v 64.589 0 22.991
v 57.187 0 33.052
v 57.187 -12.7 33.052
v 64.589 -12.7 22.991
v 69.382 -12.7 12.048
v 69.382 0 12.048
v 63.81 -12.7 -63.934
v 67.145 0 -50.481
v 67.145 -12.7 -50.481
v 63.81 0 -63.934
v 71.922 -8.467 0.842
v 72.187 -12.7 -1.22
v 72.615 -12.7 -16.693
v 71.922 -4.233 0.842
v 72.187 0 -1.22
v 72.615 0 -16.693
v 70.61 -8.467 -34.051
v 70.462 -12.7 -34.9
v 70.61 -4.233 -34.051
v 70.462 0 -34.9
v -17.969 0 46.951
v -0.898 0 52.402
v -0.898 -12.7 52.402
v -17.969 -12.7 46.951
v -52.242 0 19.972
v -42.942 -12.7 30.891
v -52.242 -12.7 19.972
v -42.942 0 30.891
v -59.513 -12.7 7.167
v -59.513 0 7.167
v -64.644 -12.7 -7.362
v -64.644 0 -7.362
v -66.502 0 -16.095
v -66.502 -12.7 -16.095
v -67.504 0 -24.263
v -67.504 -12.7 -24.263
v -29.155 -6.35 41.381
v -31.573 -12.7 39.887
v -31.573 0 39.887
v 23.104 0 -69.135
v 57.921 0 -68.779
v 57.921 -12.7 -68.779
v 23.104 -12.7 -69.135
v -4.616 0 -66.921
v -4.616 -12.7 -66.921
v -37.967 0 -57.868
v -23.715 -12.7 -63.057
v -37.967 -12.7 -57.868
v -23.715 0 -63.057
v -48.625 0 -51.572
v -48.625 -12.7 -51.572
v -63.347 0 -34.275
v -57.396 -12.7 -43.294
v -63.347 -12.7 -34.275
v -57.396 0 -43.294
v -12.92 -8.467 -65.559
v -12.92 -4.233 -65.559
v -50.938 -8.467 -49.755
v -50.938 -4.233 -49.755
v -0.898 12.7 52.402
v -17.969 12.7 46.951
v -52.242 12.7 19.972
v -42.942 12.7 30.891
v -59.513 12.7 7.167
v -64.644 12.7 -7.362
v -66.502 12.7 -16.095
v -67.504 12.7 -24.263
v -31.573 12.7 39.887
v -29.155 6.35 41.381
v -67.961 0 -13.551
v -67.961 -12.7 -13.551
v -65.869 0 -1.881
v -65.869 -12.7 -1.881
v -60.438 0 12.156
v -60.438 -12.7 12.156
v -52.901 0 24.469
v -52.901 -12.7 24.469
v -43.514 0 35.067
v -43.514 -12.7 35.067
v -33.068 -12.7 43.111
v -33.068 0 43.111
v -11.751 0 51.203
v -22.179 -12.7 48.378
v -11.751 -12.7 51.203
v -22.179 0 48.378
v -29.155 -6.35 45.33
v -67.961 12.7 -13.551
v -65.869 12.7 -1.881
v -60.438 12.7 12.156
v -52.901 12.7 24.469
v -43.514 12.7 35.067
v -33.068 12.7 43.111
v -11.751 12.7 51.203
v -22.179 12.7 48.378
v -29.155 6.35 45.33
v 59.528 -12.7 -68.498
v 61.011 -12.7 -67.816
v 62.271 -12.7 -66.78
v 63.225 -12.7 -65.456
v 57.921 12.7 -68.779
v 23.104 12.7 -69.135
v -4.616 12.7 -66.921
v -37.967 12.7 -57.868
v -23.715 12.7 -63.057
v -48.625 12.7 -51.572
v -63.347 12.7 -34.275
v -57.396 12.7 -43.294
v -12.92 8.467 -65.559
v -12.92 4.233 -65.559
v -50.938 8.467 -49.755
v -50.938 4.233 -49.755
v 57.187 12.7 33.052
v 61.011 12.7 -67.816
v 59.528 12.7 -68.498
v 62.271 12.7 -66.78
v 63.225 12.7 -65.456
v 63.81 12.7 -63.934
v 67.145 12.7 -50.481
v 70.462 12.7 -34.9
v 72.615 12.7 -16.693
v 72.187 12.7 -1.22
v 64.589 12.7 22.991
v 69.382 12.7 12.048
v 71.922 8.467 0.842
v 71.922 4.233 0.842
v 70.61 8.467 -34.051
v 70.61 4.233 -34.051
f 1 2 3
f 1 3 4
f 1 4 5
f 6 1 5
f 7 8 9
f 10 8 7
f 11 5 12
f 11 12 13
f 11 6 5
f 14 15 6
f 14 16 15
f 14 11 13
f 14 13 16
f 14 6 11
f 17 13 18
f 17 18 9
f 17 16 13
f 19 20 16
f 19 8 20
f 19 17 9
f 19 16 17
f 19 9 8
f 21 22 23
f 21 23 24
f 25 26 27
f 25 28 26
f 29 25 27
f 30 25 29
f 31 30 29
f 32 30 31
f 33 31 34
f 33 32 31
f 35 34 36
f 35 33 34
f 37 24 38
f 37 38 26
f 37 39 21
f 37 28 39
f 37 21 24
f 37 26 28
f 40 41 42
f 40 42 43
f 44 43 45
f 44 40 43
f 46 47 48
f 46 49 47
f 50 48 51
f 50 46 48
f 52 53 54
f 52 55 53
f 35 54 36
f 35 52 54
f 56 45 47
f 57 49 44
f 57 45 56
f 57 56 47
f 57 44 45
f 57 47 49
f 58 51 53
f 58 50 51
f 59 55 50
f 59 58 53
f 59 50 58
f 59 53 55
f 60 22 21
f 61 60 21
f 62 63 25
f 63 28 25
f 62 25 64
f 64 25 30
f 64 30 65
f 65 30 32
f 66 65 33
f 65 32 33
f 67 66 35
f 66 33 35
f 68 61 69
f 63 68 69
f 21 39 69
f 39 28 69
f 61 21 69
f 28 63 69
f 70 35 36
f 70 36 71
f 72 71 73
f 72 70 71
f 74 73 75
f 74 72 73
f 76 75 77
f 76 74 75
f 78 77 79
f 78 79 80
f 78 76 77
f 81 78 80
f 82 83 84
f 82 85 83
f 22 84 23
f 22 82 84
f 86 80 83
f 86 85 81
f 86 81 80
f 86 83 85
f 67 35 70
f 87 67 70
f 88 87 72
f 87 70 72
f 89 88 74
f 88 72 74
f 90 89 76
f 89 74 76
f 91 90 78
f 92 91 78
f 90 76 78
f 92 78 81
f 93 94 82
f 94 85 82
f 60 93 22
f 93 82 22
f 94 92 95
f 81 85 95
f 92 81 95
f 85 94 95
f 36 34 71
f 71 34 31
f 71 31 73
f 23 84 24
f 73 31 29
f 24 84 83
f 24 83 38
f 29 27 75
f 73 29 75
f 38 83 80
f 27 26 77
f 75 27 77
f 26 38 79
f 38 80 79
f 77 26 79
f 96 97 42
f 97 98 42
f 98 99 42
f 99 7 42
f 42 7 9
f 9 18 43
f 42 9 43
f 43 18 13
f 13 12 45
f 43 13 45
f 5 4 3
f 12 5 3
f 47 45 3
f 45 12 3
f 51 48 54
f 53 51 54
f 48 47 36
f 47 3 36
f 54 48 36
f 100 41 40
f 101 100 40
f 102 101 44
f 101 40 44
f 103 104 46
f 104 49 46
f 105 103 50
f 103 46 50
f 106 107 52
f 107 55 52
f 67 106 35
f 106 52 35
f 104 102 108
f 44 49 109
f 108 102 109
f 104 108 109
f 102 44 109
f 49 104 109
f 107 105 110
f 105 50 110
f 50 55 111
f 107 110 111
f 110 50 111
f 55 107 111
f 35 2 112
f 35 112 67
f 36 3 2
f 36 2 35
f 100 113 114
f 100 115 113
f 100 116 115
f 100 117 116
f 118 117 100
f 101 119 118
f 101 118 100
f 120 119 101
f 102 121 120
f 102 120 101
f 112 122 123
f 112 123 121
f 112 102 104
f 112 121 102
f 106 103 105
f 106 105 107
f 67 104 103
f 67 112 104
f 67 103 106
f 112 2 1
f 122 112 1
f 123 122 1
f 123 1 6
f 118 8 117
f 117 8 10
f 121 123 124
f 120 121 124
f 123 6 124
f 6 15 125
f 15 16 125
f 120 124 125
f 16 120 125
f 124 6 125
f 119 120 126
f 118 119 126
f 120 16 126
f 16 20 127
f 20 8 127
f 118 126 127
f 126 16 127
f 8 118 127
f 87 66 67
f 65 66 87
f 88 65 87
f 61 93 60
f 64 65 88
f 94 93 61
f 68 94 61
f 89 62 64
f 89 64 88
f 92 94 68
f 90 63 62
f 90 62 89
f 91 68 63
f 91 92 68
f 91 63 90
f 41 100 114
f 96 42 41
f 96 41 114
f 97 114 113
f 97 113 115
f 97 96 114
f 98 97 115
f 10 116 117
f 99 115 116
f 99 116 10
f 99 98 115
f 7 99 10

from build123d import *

# Parameters (mm, degrees)
F1_DEPTH = 12.7


with BuildPart() as f1:
    # F0 (on Front) → F1 (new body, symmetric)
    with BuildSketch(Plane.XZ):
        with BuildLine():
            add(Edge.make_bspline(
                [(57.1871035576, 33.0515832115), (83.4640090894, 4.7482788241), (69.8356338221, -39.121123681), (63.8103867226, -63.9335548477)],
                knots=[0, 0, 0, 0, 95.5050447095, 95.5050447095, 95.5050447095, 95.5050447095], degree=3))
            Line((57.1871035576, 33.0515832115), (-67.5041534908, -24.2631812721))
            add(Edge.make_bspline(
                [(57.9210074343, -68.7788861237), (-33.1218832719, -72.8158713516), (-57.8737772663, -53.6331943002), (-67.5041534908, -24.2631812721)],
                knots=[2.3552403512, 2.3552403512, 2.3552403512, 2.3552403512, 137.5659066611, 137.5659066611, 137.5659066611, 137.5659066611], degree=3))
            ThreePointArc((57.9210074343, -68.7788861237), (61.6741008128, -67.3388150573), (63.8103867226, -63.9335548477))
        make_face()
    extrude(amount=F1_DEPTH, both=True)


with BuildPart() as f1b:
    # F0 (on Front) → F1, piece 2 (new body, symmetric)
    with BuildSketch(Plane.XZ):
        with BuildLine():
            add(Edge.make_bspline(
                [(-0.8981807459, 52.4018313512), (-11.0166847084, 50.0759443022), (-54.3602010989, 33.3948801257), (-65.879063599, -3.8987406946), (-67.5041534908, -24.2631812721)],
                knots=[0.3733611821, 0.3733611821, 0.3733611821, 0.3733611821, 0.5164799744, 1, 1, 1, 1], degree=3))
            add(Edge.make_bspline(
                [(-67.5041534908, -24.2631812721), (-71.4835964909, -2.1616155462), (-49.9112308582, 43.0663063494), (-10.8057204253, 52.0165849428), (-0.8981807459, 52.4018313512)],
                knots=[0, 0, 0, 0, 0.488366921, 0.64981559, 0.64981559, 0.64981559, 0.64981559], degree=3))
        make_face()
    extrude(amount=F1_DEPTH, both=True)


solid = Compound([f1.part, f1b.part])
